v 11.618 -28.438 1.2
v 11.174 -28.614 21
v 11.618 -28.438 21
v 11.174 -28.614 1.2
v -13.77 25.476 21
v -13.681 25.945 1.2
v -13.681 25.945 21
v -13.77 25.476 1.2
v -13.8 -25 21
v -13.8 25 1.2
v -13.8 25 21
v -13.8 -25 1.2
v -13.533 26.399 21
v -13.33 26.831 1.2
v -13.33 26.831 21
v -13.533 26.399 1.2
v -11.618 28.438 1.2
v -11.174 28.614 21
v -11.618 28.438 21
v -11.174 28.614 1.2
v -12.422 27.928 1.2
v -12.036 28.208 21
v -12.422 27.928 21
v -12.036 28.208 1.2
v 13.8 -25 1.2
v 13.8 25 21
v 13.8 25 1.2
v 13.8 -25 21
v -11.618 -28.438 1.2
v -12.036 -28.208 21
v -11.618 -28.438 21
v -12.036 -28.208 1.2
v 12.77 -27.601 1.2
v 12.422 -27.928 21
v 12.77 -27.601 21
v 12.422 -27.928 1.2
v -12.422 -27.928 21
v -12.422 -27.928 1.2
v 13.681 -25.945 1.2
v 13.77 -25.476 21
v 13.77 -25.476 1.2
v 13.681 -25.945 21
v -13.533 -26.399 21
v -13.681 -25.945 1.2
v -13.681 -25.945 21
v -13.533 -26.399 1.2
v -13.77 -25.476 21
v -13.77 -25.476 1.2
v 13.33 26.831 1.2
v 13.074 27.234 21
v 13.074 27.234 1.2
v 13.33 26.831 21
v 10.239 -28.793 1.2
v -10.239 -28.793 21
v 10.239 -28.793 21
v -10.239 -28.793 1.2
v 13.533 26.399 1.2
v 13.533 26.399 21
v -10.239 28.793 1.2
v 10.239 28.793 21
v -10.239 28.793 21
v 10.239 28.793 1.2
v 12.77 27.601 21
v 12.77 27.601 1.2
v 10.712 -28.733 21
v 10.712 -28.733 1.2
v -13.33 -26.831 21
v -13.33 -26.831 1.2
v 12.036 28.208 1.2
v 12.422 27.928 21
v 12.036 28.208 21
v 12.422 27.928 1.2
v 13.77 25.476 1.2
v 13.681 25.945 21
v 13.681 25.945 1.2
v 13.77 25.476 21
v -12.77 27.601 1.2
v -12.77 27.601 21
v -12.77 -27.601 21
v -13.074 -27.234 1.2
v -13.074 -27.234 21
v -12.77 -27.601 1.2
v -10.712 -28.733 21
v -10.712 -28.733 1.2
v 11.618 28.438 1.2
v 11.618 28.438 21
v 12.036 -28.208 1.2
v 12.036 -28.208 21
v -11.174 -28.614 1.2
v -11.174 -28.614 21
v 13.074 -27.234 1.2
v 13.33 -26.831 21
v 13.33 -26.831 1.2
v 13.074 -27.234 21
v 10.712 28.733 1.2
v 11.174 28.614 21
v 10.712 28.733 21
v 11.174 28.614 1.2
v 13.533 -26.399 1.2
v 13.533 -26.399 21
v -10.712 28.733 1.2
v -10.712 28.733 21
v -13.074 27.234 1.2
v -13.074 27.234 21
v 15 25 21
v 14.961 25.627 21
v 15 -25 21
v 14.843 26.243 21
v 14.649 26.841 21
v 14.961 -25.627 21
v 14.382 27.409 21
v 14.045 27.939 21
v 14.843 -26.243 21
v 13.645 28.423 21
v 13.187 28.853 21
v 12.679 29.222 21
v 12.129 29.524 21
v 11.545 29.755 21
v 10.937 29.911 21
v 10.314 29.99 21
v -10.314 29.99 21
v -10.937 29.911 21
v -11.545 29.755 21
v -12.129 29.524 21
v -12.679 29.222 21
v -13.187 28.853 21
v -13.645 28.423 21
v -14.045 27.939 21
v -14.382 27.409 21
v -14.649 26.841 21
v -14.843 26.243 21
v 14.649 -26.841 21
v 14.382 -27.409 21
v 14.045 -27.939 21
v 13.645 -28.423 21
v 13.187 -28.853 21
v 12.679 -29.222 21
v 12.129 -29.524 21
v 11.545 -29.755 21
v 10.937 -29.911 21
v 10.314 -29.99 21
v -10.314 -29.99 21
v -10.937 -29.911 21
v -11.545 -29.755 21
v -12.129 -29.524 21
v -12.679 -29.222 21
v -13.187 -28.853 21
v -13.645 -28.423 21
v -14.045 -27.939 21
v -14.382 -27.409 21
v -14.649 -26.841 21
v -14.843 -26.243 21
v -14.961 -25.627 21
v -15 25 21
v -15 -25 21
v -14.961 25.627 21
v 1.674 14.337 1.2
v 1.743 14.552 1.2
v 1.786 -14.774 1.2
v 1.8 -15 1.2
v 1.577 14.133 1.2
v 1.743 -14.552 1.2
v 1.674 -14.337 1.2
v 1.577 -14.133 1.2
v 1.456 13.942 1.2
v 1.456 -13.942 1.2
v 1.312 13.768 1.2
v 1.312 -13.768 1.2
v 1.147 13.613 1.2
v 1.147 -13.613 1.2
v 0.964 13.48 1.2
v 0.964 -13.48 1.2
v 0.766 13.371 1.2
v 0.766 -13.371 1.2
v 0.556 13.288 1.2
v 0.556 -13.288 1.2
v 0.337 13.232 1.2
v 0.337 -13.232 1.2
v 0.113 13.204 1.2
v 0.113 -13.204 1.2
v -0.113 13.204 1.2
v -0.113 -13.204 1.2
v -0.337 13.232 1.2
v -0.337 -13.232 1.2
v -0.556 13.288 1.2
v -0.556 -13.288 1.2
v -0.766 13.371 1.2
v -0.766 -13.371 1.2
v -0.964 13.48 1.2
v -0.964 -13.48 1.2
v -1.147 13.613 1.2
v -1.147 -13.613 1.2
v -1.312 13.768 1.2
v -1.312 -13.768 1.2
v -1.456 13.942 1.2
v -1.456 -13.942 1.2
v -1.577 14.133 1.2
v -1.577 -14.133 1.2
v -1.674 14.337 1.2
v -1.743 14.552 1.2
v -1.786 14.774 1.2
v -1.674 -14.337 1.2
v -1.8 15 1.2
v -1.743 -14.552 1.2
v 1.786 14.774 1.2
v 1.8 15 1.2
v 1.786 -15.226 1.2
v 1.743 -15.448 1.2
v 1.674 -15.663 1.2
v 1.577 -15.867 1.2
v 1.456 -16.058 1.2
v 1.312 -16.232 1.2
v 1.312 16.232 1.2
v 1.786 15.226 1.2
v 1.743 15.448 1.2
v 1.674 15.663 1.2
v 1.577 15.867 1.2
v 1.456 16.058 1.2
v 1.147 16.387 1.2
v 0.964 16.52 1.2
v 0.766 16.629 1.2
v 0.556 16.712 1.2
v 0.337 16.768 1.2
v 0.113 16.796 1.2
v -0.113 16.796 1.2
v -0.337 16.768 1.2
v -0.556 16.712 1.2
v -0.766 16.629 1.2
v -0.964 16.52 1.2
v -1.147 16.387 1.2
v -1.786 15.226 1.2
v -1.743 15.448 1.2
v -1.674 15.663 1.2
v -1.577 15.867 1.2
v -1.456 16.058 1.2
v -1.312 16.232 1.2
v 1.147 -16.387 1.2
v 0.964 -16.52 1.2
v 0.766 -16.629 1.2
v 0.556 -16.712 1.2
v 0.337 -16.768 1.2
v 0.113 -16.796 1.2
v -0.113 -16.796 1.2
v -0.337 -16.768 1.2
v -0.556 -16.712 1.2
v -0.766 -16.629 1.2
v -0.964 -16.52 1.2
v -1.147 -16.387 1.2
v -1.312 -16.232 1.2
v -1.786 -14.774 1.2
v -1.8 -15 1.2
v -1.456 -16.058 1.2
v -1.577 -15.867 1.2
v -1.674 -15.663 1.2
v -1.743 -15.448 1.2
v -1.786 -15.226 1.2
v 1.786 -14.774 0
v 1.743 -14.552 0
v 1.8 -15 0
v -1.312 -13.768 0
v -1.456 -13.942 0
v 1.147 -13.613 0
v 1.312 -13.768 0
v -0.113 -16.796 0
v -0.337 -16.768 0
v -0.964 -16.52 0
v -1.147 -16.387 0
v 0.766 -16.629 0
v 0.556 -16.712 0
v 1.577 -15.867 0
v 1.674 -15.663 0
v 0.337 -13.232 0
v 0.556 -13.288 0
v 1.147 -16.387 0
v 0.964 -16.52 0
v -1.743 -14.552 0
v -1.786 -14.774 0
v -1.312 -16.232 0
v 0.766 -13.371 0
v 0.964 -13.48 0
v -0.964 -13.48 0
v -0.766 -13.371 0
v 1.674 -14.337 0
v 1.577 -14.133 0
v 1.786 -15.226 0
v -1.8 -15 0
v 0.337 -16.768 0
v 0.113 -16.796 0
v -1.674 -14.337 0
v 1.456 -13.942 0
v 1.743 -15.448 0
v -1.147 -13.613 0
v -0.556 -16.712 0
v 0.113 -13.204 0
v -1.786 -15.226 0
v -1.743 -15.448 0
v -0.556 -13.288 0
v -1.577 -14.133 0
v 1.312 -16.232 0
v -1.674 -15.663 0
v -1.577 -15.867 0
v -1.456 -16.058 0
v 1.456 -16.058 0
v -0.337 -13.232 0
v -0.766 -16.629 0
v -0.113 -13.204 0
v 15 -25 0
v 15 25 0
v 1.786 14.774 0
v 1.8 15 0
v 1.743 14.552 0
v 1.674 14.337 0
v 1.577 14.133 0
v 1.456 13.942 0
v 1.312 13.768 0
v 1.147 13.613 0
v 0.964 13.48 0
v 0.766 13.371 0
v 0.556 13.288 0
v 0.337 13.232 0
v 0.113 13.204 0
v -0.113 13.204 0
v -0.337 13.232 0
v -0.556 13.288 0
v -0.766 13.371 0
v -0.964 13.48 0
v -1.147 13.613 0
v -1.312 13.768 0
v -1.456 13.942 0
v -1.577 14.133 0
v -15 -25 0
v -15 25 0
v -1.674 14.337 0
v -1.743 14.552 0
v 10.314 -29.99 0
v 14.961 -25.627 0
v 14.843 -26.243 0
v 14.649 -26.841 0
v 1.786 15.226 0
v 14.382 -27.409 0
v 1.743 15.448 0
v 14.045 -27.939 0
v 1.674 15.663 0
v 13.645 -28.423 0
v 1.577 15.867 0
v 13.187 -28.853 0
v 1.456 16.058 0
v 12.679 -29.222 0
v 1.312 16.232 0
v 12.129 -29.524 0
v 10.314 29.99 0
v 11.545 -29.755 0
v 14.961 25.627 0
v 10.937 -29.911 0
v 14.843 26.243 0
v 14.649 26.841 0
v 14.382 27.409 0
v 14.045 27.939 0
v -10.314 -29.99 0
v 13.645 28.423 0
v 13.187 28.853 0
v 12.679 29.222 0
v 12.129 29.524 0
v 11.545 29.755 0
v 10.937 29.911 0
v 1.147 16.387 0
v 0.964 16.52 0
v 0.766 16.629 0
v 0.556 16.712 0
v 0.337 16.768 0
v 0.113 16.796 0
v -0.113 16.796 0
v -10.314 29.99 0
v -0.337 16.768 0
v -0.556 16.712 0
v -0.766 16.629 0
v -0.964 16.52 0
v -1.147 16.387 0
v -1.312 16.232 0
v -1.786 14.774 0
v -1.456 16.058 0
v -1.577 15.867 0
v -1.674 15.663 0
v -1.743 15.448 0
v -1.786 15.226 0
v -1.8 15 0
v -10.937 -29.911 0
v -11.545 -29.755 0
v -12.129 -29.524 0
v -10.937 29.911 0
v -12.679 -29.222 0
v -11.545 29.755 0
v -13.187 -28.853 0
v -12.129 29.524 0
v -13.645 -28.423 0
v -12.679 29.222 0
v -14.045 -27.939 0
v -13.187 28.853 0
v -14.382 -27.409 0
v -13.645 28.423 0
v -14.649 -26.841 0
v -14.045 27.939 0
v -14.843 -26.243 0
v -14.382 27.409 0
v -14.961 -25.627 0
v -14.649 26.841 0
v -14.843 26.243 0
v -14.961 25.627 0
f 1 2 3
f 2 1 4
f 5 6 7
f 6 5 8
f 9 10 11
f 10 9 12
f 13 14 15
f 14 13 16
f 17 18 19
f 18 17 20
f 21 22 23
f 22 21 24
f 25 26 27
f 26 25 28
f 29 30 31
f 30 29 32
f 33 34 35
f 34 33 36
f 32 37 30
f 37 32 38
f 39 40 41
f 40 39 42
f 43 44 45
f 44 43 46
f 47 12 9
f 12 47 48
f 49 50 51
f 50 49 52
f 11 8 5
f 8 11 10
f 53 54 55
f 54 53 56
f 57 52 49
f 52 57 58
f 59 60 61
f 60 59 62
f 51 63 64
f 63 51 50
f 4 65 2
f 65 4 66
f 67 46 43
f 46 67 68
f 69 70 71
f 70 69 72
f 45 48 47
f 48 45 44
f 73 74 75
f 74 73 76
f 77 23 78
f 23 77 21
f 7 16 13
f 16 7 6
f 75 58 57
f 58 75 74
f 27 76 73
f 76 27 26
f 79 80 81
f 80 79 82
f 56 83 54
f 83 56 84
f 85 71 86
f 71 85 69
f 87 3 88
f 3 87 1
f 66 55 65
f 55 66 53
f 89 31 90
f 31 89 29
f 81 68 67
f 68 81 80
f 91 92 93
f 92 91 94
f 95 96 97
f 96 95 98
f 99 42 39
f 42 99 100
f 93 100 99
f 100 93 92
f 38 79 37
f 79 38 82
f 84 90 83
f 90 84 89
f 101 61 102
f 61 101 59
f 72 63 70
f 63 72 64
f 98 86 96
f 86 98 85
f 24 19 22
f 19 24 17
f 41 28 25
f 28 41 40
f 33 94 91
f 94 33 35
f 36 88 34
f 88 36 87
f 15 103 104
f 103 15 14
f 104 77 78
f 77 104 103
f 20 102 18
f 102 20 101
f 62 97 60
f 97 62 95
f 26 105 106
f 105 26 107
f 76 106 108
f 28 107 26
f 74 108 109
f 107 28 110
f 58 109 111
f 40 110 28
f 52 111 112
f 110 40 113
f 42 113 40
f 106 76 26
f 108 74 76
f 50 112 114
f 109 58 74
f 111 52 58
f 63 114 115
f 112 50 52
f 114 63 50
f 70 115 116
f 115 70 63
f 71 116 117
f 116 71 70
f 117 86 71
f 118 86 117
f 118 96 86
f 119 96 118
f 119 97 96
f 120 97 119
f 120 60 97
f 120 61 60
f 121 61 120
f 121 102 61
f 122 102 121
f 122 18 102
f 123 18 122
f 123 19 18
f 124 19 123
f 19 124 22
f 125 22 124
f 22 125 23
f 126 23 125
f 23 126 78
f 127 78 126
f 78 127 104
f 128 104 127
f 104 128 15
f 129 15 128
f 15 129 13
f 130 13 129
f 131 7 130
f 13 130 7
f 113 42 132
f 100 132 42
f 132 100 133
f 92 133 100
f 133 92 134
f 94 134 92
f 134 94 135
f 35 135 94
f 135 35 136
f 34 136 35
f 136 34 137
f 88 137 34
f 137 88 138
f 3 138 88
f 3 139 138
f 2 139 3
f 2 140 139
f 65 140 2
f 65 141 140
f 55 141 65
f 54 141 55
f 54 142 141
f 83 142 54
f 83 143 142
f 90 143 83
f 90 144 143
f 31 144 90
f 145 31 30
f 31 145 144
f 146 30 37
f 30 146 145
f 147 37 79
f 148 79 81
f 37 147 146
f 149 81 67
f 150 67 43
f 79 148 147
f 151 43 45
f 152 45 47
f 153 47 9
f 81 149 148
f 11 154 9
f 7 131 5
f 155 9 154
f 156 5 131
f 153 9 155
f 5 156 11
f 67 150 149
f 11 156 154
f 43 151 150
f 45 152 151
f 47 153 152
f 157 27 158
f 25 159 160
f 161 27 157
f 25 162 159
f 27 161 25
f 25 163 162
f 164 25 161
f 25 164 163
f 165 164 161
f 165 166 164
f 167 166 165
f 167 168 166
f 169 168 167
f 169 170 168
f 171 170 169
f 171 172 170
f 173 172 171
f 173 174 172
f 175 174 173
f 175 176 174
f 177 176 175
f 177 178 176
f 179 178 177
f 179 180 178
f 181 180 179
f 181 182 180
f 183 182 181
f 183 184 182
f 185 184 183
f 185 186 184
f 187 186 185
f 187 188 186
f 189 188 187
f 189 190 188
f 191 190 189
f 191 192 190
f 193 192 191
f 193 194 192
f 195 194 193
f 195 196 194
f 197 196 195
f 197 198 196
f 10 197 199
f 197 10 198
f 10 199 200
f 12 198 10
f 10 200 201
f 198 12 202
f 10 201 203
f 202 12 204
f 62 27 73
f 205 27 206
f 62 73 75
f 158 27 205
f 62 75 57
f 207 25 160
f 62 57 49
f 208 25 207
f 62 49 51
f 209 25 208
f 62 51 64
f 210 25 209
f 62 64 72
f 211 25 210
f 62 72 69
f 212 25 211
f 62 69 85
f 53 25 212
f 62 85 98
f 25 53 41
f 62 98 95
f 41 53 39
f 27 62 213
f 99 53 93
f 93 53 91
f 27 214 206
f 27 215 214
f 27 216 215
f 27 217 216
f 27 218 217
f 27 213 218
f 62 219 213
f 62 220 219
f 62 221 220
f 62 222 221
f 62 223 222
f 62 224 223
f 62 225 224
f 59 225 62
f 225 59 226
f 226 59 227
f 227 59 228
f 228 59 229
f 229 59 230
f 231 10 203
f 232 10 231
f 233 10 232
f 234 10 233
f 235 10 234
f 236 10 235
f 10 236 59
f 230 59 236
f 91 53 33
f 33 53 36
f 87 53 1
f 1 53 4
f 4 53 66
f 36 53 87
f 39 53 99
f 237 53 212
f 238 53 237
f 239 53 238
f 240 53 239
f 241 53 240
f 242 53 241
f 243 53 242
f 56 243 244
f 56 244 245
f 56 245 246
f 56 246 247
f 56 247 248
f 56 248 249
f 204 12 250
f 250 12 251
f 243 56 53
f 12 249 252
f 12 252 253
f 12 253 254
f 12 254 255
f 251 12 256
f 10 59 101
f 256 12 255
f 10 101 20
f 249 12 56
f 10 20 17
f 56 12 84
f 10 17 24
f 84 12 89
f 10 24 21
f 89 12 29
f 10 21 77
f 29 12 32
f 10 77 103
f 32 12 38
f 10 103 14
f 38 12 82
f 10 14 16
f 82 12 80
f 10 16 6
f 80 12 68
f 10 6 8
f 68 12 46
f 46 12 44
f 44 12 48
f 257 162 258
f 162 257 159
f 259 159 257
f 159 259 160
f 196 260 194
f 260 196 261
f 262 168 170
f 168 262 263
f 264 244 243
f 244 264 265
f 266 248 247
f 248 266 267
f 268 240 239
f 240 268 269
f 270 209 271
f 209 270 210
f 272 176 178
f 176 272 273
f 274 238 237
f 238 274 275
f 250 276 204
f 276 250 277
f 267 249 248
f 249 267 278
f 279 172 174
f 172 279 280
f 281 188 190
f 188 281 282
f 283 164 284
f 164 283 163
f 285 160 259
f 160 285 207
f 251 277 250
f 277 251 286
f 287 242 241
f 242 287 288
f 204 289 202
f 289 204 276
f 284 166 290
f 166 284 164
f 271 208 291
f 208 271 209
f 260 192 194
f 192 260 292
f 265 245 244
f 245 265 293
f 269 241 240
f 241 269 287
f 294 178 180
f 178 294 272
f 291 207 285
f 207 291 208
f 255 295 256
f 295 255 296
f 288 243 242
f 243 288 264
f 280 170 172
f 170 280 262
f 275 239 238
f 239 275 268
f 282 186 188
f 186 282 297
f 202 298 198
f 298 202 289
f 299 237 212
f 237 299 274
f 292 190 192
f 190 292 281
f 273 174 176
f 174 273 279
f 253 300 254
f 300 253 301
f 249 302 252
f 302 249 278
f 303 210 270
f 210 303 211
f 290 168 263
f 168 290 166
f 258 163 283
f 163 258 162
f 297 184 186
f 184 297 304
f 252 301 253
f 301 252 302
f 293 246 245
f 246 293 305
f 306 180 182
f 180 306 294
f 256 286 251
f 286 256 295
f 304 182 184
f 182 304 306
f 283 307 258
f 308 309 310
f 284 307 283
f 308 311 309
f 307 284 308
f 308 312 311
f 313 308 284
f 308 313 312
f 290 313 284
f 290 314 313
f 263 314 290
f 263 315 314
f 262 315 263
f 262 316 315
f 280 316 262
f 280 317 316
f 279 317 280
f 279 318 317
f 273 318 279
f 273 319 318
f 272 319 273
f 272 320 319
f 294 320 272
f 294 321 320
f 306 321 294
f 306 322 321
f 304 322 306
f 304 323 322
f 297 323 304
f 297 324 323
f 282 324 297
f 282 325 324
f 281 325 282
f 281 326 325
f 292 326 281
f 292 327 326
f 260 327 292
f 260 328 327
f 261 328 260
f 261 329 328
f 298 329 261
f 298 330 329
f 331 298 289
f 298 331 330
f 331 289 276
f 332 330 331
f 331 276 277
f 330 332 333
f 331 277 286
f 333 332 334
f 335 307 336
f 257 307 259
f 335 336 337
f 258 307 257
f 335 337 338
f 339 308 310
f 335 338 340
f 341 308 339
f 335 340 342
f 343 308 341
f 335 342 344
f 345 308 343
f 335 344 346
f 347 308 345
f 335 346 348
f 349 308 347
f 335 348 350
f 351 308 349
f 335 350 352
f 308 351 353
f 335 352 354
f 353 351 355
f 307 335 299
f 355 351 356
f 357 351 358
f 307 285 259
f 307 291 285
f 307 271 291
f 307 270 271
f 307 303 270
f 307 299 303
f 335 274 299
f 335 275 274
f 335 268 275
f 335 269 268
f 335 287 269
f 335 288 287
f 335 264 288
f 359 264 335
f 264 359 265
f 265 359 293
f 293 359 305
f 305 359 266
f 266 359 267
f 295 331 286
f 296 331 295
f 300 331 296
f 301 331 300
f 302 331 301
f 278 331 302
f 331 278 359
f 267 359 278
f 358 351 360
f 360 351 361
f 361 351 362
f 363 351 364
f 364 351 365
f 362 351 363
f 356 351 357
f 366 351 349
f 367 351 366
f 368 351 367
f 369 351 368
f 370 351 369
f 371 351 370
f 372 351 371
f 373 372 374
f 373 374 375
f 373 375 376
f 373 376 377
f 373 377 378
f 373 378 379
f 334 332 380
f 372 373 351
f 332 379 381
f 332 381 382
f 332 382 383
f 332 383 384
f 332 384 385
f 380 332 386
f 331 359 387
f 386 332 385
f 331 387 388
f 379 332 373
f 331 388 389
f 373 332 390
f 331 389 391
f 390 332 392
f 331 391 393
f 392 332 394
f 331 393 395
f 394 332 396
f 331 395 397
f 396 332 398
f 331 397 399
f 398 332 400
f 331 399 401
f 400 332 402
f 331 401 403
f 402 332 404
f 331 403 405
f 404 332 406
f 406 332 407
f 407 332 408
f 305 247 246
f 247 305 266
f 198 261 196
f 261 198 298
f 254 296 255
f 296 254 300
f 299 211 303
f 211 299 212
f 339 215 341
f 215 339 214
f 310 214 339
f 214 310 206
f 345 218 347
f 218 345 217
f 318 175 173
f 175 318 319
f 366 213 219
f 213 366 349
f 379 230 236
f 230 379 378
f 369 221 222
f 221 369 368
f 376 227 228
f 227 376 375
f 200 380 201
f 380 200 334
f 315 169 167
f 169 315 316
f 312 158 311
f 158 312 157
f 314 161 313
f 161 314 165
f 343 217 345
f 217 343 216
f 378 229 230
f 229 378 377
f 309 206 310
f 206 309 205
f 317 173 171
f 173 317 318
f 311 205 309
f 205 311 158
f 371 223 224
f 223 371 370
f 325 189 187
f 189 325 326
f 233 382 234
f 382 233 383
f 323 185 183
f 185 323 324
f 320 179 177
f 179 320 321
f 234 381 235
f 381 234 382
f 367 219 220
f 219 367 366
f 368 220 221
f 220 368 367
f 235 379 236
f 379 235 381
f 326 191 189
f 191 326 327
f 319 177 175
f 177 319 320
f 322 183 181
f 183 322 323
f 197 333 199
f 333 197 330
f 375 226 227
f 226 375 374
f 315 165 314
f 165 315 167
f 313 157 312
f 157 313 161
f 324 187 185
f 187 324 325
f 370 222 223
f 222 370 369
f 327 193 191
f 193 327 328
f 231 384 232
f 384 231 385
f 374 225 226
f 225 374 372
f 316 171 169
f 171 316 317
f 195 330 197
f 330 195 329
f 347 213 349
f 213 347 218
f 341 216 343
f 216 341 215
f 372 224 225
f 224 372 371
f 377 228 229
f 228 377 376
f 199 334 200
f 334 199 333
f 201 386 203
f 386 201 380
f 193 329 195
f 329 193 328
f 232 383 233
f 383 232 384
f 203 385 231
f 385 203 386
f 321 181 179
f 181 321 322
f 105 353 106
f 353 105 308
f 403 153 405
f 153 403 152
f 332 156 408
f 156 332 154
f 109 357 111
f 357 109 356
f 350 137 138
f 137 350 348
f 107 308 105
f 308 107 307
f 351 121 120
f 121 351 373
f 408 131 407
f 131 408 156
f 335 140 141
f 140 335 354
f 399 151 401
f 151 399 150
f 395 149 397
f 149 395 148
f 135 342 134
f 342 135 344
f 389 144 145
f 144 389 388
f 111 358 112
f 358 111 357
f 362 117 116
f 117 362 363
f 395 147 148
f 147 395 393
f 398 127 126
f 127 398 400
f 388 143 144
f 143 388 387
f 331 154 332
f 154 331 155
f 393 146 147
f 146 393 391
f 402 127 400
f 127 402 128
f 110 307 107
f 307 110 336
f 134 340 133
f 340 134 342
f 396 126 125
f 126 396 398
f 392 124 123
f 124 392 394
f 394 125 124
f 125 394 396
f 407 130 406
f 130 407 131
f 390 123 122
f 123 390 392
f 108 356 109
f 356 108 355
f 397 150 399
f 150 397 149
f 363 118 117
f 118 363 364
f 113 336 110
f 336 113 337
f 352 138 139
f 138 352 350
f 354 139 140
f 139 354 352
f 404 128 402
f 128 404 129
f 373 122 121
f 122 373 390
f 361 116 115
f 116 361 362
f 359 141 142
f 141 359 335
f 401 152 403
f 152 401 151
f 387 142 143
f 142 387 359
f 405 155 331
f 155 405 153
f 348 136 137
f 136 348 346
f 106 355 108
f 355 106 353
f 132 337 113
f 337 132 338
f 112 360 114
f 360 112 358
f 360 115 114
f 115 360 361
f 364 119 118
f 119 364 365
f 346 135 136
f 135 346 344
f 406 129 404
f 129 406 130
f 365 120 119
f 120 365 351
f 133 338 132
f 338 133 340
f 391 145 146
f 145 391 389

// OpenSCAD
$fn = 50;


difference() {
	union() {
		hull() {
			translate(v = [-10.0000000000, 25.0000000000, 0]) {
				cylinder(h = 21, r = 5);
			}
			translate(v = [10.0000000000, 25.0000000000, 0]) {
				cylinder(h = 21, r = 5);
			}
			translate(v = [-10.0000000000, -25.0000000000, 0]) {
				cylinder(h = 21, r = 5);
			}
			translate(v = [10.0000000000, -25.0000000000, 0]) {
				cylinder(h = 21, r = 5);
			}
		}
	}
	union() {
		translate(v = [0, 0, 1.2000000000]) {
			hull() {
				translate(v = [-10.0000000000, 25.0000000000, 0]) {
					cylinder(h = 19.8000000000, r = 3.8000000000);
				}
				translate(v = [10.0000000000, 25.0000000000, 0]) {
					cylinder(h = 19.8000000000, r = 3.8000000000);
				}
				translate(v = [-10.0000000000, -25.0000000000, 0]) {
					cylinder(h = 19.8000000000, r = 3.8000000000);
				}
				translate(v = [10.0000000000, -25.0000000000, 0]) {
					cylinder(h = 19.8000000000, r = 3.8000000000);
				}
			}
		}
		#translate(v = [0.0000000000, -15.0000000000, 0]) {
			cylinder(h = 1.2000000000, r = 1.8000000000);
		}
		#translate(v = [0.0000000000, 15.0000000000, 0]) {
			cylinder(h = 1.2000000000, r = 1.8000000000);
		}
	}
}
